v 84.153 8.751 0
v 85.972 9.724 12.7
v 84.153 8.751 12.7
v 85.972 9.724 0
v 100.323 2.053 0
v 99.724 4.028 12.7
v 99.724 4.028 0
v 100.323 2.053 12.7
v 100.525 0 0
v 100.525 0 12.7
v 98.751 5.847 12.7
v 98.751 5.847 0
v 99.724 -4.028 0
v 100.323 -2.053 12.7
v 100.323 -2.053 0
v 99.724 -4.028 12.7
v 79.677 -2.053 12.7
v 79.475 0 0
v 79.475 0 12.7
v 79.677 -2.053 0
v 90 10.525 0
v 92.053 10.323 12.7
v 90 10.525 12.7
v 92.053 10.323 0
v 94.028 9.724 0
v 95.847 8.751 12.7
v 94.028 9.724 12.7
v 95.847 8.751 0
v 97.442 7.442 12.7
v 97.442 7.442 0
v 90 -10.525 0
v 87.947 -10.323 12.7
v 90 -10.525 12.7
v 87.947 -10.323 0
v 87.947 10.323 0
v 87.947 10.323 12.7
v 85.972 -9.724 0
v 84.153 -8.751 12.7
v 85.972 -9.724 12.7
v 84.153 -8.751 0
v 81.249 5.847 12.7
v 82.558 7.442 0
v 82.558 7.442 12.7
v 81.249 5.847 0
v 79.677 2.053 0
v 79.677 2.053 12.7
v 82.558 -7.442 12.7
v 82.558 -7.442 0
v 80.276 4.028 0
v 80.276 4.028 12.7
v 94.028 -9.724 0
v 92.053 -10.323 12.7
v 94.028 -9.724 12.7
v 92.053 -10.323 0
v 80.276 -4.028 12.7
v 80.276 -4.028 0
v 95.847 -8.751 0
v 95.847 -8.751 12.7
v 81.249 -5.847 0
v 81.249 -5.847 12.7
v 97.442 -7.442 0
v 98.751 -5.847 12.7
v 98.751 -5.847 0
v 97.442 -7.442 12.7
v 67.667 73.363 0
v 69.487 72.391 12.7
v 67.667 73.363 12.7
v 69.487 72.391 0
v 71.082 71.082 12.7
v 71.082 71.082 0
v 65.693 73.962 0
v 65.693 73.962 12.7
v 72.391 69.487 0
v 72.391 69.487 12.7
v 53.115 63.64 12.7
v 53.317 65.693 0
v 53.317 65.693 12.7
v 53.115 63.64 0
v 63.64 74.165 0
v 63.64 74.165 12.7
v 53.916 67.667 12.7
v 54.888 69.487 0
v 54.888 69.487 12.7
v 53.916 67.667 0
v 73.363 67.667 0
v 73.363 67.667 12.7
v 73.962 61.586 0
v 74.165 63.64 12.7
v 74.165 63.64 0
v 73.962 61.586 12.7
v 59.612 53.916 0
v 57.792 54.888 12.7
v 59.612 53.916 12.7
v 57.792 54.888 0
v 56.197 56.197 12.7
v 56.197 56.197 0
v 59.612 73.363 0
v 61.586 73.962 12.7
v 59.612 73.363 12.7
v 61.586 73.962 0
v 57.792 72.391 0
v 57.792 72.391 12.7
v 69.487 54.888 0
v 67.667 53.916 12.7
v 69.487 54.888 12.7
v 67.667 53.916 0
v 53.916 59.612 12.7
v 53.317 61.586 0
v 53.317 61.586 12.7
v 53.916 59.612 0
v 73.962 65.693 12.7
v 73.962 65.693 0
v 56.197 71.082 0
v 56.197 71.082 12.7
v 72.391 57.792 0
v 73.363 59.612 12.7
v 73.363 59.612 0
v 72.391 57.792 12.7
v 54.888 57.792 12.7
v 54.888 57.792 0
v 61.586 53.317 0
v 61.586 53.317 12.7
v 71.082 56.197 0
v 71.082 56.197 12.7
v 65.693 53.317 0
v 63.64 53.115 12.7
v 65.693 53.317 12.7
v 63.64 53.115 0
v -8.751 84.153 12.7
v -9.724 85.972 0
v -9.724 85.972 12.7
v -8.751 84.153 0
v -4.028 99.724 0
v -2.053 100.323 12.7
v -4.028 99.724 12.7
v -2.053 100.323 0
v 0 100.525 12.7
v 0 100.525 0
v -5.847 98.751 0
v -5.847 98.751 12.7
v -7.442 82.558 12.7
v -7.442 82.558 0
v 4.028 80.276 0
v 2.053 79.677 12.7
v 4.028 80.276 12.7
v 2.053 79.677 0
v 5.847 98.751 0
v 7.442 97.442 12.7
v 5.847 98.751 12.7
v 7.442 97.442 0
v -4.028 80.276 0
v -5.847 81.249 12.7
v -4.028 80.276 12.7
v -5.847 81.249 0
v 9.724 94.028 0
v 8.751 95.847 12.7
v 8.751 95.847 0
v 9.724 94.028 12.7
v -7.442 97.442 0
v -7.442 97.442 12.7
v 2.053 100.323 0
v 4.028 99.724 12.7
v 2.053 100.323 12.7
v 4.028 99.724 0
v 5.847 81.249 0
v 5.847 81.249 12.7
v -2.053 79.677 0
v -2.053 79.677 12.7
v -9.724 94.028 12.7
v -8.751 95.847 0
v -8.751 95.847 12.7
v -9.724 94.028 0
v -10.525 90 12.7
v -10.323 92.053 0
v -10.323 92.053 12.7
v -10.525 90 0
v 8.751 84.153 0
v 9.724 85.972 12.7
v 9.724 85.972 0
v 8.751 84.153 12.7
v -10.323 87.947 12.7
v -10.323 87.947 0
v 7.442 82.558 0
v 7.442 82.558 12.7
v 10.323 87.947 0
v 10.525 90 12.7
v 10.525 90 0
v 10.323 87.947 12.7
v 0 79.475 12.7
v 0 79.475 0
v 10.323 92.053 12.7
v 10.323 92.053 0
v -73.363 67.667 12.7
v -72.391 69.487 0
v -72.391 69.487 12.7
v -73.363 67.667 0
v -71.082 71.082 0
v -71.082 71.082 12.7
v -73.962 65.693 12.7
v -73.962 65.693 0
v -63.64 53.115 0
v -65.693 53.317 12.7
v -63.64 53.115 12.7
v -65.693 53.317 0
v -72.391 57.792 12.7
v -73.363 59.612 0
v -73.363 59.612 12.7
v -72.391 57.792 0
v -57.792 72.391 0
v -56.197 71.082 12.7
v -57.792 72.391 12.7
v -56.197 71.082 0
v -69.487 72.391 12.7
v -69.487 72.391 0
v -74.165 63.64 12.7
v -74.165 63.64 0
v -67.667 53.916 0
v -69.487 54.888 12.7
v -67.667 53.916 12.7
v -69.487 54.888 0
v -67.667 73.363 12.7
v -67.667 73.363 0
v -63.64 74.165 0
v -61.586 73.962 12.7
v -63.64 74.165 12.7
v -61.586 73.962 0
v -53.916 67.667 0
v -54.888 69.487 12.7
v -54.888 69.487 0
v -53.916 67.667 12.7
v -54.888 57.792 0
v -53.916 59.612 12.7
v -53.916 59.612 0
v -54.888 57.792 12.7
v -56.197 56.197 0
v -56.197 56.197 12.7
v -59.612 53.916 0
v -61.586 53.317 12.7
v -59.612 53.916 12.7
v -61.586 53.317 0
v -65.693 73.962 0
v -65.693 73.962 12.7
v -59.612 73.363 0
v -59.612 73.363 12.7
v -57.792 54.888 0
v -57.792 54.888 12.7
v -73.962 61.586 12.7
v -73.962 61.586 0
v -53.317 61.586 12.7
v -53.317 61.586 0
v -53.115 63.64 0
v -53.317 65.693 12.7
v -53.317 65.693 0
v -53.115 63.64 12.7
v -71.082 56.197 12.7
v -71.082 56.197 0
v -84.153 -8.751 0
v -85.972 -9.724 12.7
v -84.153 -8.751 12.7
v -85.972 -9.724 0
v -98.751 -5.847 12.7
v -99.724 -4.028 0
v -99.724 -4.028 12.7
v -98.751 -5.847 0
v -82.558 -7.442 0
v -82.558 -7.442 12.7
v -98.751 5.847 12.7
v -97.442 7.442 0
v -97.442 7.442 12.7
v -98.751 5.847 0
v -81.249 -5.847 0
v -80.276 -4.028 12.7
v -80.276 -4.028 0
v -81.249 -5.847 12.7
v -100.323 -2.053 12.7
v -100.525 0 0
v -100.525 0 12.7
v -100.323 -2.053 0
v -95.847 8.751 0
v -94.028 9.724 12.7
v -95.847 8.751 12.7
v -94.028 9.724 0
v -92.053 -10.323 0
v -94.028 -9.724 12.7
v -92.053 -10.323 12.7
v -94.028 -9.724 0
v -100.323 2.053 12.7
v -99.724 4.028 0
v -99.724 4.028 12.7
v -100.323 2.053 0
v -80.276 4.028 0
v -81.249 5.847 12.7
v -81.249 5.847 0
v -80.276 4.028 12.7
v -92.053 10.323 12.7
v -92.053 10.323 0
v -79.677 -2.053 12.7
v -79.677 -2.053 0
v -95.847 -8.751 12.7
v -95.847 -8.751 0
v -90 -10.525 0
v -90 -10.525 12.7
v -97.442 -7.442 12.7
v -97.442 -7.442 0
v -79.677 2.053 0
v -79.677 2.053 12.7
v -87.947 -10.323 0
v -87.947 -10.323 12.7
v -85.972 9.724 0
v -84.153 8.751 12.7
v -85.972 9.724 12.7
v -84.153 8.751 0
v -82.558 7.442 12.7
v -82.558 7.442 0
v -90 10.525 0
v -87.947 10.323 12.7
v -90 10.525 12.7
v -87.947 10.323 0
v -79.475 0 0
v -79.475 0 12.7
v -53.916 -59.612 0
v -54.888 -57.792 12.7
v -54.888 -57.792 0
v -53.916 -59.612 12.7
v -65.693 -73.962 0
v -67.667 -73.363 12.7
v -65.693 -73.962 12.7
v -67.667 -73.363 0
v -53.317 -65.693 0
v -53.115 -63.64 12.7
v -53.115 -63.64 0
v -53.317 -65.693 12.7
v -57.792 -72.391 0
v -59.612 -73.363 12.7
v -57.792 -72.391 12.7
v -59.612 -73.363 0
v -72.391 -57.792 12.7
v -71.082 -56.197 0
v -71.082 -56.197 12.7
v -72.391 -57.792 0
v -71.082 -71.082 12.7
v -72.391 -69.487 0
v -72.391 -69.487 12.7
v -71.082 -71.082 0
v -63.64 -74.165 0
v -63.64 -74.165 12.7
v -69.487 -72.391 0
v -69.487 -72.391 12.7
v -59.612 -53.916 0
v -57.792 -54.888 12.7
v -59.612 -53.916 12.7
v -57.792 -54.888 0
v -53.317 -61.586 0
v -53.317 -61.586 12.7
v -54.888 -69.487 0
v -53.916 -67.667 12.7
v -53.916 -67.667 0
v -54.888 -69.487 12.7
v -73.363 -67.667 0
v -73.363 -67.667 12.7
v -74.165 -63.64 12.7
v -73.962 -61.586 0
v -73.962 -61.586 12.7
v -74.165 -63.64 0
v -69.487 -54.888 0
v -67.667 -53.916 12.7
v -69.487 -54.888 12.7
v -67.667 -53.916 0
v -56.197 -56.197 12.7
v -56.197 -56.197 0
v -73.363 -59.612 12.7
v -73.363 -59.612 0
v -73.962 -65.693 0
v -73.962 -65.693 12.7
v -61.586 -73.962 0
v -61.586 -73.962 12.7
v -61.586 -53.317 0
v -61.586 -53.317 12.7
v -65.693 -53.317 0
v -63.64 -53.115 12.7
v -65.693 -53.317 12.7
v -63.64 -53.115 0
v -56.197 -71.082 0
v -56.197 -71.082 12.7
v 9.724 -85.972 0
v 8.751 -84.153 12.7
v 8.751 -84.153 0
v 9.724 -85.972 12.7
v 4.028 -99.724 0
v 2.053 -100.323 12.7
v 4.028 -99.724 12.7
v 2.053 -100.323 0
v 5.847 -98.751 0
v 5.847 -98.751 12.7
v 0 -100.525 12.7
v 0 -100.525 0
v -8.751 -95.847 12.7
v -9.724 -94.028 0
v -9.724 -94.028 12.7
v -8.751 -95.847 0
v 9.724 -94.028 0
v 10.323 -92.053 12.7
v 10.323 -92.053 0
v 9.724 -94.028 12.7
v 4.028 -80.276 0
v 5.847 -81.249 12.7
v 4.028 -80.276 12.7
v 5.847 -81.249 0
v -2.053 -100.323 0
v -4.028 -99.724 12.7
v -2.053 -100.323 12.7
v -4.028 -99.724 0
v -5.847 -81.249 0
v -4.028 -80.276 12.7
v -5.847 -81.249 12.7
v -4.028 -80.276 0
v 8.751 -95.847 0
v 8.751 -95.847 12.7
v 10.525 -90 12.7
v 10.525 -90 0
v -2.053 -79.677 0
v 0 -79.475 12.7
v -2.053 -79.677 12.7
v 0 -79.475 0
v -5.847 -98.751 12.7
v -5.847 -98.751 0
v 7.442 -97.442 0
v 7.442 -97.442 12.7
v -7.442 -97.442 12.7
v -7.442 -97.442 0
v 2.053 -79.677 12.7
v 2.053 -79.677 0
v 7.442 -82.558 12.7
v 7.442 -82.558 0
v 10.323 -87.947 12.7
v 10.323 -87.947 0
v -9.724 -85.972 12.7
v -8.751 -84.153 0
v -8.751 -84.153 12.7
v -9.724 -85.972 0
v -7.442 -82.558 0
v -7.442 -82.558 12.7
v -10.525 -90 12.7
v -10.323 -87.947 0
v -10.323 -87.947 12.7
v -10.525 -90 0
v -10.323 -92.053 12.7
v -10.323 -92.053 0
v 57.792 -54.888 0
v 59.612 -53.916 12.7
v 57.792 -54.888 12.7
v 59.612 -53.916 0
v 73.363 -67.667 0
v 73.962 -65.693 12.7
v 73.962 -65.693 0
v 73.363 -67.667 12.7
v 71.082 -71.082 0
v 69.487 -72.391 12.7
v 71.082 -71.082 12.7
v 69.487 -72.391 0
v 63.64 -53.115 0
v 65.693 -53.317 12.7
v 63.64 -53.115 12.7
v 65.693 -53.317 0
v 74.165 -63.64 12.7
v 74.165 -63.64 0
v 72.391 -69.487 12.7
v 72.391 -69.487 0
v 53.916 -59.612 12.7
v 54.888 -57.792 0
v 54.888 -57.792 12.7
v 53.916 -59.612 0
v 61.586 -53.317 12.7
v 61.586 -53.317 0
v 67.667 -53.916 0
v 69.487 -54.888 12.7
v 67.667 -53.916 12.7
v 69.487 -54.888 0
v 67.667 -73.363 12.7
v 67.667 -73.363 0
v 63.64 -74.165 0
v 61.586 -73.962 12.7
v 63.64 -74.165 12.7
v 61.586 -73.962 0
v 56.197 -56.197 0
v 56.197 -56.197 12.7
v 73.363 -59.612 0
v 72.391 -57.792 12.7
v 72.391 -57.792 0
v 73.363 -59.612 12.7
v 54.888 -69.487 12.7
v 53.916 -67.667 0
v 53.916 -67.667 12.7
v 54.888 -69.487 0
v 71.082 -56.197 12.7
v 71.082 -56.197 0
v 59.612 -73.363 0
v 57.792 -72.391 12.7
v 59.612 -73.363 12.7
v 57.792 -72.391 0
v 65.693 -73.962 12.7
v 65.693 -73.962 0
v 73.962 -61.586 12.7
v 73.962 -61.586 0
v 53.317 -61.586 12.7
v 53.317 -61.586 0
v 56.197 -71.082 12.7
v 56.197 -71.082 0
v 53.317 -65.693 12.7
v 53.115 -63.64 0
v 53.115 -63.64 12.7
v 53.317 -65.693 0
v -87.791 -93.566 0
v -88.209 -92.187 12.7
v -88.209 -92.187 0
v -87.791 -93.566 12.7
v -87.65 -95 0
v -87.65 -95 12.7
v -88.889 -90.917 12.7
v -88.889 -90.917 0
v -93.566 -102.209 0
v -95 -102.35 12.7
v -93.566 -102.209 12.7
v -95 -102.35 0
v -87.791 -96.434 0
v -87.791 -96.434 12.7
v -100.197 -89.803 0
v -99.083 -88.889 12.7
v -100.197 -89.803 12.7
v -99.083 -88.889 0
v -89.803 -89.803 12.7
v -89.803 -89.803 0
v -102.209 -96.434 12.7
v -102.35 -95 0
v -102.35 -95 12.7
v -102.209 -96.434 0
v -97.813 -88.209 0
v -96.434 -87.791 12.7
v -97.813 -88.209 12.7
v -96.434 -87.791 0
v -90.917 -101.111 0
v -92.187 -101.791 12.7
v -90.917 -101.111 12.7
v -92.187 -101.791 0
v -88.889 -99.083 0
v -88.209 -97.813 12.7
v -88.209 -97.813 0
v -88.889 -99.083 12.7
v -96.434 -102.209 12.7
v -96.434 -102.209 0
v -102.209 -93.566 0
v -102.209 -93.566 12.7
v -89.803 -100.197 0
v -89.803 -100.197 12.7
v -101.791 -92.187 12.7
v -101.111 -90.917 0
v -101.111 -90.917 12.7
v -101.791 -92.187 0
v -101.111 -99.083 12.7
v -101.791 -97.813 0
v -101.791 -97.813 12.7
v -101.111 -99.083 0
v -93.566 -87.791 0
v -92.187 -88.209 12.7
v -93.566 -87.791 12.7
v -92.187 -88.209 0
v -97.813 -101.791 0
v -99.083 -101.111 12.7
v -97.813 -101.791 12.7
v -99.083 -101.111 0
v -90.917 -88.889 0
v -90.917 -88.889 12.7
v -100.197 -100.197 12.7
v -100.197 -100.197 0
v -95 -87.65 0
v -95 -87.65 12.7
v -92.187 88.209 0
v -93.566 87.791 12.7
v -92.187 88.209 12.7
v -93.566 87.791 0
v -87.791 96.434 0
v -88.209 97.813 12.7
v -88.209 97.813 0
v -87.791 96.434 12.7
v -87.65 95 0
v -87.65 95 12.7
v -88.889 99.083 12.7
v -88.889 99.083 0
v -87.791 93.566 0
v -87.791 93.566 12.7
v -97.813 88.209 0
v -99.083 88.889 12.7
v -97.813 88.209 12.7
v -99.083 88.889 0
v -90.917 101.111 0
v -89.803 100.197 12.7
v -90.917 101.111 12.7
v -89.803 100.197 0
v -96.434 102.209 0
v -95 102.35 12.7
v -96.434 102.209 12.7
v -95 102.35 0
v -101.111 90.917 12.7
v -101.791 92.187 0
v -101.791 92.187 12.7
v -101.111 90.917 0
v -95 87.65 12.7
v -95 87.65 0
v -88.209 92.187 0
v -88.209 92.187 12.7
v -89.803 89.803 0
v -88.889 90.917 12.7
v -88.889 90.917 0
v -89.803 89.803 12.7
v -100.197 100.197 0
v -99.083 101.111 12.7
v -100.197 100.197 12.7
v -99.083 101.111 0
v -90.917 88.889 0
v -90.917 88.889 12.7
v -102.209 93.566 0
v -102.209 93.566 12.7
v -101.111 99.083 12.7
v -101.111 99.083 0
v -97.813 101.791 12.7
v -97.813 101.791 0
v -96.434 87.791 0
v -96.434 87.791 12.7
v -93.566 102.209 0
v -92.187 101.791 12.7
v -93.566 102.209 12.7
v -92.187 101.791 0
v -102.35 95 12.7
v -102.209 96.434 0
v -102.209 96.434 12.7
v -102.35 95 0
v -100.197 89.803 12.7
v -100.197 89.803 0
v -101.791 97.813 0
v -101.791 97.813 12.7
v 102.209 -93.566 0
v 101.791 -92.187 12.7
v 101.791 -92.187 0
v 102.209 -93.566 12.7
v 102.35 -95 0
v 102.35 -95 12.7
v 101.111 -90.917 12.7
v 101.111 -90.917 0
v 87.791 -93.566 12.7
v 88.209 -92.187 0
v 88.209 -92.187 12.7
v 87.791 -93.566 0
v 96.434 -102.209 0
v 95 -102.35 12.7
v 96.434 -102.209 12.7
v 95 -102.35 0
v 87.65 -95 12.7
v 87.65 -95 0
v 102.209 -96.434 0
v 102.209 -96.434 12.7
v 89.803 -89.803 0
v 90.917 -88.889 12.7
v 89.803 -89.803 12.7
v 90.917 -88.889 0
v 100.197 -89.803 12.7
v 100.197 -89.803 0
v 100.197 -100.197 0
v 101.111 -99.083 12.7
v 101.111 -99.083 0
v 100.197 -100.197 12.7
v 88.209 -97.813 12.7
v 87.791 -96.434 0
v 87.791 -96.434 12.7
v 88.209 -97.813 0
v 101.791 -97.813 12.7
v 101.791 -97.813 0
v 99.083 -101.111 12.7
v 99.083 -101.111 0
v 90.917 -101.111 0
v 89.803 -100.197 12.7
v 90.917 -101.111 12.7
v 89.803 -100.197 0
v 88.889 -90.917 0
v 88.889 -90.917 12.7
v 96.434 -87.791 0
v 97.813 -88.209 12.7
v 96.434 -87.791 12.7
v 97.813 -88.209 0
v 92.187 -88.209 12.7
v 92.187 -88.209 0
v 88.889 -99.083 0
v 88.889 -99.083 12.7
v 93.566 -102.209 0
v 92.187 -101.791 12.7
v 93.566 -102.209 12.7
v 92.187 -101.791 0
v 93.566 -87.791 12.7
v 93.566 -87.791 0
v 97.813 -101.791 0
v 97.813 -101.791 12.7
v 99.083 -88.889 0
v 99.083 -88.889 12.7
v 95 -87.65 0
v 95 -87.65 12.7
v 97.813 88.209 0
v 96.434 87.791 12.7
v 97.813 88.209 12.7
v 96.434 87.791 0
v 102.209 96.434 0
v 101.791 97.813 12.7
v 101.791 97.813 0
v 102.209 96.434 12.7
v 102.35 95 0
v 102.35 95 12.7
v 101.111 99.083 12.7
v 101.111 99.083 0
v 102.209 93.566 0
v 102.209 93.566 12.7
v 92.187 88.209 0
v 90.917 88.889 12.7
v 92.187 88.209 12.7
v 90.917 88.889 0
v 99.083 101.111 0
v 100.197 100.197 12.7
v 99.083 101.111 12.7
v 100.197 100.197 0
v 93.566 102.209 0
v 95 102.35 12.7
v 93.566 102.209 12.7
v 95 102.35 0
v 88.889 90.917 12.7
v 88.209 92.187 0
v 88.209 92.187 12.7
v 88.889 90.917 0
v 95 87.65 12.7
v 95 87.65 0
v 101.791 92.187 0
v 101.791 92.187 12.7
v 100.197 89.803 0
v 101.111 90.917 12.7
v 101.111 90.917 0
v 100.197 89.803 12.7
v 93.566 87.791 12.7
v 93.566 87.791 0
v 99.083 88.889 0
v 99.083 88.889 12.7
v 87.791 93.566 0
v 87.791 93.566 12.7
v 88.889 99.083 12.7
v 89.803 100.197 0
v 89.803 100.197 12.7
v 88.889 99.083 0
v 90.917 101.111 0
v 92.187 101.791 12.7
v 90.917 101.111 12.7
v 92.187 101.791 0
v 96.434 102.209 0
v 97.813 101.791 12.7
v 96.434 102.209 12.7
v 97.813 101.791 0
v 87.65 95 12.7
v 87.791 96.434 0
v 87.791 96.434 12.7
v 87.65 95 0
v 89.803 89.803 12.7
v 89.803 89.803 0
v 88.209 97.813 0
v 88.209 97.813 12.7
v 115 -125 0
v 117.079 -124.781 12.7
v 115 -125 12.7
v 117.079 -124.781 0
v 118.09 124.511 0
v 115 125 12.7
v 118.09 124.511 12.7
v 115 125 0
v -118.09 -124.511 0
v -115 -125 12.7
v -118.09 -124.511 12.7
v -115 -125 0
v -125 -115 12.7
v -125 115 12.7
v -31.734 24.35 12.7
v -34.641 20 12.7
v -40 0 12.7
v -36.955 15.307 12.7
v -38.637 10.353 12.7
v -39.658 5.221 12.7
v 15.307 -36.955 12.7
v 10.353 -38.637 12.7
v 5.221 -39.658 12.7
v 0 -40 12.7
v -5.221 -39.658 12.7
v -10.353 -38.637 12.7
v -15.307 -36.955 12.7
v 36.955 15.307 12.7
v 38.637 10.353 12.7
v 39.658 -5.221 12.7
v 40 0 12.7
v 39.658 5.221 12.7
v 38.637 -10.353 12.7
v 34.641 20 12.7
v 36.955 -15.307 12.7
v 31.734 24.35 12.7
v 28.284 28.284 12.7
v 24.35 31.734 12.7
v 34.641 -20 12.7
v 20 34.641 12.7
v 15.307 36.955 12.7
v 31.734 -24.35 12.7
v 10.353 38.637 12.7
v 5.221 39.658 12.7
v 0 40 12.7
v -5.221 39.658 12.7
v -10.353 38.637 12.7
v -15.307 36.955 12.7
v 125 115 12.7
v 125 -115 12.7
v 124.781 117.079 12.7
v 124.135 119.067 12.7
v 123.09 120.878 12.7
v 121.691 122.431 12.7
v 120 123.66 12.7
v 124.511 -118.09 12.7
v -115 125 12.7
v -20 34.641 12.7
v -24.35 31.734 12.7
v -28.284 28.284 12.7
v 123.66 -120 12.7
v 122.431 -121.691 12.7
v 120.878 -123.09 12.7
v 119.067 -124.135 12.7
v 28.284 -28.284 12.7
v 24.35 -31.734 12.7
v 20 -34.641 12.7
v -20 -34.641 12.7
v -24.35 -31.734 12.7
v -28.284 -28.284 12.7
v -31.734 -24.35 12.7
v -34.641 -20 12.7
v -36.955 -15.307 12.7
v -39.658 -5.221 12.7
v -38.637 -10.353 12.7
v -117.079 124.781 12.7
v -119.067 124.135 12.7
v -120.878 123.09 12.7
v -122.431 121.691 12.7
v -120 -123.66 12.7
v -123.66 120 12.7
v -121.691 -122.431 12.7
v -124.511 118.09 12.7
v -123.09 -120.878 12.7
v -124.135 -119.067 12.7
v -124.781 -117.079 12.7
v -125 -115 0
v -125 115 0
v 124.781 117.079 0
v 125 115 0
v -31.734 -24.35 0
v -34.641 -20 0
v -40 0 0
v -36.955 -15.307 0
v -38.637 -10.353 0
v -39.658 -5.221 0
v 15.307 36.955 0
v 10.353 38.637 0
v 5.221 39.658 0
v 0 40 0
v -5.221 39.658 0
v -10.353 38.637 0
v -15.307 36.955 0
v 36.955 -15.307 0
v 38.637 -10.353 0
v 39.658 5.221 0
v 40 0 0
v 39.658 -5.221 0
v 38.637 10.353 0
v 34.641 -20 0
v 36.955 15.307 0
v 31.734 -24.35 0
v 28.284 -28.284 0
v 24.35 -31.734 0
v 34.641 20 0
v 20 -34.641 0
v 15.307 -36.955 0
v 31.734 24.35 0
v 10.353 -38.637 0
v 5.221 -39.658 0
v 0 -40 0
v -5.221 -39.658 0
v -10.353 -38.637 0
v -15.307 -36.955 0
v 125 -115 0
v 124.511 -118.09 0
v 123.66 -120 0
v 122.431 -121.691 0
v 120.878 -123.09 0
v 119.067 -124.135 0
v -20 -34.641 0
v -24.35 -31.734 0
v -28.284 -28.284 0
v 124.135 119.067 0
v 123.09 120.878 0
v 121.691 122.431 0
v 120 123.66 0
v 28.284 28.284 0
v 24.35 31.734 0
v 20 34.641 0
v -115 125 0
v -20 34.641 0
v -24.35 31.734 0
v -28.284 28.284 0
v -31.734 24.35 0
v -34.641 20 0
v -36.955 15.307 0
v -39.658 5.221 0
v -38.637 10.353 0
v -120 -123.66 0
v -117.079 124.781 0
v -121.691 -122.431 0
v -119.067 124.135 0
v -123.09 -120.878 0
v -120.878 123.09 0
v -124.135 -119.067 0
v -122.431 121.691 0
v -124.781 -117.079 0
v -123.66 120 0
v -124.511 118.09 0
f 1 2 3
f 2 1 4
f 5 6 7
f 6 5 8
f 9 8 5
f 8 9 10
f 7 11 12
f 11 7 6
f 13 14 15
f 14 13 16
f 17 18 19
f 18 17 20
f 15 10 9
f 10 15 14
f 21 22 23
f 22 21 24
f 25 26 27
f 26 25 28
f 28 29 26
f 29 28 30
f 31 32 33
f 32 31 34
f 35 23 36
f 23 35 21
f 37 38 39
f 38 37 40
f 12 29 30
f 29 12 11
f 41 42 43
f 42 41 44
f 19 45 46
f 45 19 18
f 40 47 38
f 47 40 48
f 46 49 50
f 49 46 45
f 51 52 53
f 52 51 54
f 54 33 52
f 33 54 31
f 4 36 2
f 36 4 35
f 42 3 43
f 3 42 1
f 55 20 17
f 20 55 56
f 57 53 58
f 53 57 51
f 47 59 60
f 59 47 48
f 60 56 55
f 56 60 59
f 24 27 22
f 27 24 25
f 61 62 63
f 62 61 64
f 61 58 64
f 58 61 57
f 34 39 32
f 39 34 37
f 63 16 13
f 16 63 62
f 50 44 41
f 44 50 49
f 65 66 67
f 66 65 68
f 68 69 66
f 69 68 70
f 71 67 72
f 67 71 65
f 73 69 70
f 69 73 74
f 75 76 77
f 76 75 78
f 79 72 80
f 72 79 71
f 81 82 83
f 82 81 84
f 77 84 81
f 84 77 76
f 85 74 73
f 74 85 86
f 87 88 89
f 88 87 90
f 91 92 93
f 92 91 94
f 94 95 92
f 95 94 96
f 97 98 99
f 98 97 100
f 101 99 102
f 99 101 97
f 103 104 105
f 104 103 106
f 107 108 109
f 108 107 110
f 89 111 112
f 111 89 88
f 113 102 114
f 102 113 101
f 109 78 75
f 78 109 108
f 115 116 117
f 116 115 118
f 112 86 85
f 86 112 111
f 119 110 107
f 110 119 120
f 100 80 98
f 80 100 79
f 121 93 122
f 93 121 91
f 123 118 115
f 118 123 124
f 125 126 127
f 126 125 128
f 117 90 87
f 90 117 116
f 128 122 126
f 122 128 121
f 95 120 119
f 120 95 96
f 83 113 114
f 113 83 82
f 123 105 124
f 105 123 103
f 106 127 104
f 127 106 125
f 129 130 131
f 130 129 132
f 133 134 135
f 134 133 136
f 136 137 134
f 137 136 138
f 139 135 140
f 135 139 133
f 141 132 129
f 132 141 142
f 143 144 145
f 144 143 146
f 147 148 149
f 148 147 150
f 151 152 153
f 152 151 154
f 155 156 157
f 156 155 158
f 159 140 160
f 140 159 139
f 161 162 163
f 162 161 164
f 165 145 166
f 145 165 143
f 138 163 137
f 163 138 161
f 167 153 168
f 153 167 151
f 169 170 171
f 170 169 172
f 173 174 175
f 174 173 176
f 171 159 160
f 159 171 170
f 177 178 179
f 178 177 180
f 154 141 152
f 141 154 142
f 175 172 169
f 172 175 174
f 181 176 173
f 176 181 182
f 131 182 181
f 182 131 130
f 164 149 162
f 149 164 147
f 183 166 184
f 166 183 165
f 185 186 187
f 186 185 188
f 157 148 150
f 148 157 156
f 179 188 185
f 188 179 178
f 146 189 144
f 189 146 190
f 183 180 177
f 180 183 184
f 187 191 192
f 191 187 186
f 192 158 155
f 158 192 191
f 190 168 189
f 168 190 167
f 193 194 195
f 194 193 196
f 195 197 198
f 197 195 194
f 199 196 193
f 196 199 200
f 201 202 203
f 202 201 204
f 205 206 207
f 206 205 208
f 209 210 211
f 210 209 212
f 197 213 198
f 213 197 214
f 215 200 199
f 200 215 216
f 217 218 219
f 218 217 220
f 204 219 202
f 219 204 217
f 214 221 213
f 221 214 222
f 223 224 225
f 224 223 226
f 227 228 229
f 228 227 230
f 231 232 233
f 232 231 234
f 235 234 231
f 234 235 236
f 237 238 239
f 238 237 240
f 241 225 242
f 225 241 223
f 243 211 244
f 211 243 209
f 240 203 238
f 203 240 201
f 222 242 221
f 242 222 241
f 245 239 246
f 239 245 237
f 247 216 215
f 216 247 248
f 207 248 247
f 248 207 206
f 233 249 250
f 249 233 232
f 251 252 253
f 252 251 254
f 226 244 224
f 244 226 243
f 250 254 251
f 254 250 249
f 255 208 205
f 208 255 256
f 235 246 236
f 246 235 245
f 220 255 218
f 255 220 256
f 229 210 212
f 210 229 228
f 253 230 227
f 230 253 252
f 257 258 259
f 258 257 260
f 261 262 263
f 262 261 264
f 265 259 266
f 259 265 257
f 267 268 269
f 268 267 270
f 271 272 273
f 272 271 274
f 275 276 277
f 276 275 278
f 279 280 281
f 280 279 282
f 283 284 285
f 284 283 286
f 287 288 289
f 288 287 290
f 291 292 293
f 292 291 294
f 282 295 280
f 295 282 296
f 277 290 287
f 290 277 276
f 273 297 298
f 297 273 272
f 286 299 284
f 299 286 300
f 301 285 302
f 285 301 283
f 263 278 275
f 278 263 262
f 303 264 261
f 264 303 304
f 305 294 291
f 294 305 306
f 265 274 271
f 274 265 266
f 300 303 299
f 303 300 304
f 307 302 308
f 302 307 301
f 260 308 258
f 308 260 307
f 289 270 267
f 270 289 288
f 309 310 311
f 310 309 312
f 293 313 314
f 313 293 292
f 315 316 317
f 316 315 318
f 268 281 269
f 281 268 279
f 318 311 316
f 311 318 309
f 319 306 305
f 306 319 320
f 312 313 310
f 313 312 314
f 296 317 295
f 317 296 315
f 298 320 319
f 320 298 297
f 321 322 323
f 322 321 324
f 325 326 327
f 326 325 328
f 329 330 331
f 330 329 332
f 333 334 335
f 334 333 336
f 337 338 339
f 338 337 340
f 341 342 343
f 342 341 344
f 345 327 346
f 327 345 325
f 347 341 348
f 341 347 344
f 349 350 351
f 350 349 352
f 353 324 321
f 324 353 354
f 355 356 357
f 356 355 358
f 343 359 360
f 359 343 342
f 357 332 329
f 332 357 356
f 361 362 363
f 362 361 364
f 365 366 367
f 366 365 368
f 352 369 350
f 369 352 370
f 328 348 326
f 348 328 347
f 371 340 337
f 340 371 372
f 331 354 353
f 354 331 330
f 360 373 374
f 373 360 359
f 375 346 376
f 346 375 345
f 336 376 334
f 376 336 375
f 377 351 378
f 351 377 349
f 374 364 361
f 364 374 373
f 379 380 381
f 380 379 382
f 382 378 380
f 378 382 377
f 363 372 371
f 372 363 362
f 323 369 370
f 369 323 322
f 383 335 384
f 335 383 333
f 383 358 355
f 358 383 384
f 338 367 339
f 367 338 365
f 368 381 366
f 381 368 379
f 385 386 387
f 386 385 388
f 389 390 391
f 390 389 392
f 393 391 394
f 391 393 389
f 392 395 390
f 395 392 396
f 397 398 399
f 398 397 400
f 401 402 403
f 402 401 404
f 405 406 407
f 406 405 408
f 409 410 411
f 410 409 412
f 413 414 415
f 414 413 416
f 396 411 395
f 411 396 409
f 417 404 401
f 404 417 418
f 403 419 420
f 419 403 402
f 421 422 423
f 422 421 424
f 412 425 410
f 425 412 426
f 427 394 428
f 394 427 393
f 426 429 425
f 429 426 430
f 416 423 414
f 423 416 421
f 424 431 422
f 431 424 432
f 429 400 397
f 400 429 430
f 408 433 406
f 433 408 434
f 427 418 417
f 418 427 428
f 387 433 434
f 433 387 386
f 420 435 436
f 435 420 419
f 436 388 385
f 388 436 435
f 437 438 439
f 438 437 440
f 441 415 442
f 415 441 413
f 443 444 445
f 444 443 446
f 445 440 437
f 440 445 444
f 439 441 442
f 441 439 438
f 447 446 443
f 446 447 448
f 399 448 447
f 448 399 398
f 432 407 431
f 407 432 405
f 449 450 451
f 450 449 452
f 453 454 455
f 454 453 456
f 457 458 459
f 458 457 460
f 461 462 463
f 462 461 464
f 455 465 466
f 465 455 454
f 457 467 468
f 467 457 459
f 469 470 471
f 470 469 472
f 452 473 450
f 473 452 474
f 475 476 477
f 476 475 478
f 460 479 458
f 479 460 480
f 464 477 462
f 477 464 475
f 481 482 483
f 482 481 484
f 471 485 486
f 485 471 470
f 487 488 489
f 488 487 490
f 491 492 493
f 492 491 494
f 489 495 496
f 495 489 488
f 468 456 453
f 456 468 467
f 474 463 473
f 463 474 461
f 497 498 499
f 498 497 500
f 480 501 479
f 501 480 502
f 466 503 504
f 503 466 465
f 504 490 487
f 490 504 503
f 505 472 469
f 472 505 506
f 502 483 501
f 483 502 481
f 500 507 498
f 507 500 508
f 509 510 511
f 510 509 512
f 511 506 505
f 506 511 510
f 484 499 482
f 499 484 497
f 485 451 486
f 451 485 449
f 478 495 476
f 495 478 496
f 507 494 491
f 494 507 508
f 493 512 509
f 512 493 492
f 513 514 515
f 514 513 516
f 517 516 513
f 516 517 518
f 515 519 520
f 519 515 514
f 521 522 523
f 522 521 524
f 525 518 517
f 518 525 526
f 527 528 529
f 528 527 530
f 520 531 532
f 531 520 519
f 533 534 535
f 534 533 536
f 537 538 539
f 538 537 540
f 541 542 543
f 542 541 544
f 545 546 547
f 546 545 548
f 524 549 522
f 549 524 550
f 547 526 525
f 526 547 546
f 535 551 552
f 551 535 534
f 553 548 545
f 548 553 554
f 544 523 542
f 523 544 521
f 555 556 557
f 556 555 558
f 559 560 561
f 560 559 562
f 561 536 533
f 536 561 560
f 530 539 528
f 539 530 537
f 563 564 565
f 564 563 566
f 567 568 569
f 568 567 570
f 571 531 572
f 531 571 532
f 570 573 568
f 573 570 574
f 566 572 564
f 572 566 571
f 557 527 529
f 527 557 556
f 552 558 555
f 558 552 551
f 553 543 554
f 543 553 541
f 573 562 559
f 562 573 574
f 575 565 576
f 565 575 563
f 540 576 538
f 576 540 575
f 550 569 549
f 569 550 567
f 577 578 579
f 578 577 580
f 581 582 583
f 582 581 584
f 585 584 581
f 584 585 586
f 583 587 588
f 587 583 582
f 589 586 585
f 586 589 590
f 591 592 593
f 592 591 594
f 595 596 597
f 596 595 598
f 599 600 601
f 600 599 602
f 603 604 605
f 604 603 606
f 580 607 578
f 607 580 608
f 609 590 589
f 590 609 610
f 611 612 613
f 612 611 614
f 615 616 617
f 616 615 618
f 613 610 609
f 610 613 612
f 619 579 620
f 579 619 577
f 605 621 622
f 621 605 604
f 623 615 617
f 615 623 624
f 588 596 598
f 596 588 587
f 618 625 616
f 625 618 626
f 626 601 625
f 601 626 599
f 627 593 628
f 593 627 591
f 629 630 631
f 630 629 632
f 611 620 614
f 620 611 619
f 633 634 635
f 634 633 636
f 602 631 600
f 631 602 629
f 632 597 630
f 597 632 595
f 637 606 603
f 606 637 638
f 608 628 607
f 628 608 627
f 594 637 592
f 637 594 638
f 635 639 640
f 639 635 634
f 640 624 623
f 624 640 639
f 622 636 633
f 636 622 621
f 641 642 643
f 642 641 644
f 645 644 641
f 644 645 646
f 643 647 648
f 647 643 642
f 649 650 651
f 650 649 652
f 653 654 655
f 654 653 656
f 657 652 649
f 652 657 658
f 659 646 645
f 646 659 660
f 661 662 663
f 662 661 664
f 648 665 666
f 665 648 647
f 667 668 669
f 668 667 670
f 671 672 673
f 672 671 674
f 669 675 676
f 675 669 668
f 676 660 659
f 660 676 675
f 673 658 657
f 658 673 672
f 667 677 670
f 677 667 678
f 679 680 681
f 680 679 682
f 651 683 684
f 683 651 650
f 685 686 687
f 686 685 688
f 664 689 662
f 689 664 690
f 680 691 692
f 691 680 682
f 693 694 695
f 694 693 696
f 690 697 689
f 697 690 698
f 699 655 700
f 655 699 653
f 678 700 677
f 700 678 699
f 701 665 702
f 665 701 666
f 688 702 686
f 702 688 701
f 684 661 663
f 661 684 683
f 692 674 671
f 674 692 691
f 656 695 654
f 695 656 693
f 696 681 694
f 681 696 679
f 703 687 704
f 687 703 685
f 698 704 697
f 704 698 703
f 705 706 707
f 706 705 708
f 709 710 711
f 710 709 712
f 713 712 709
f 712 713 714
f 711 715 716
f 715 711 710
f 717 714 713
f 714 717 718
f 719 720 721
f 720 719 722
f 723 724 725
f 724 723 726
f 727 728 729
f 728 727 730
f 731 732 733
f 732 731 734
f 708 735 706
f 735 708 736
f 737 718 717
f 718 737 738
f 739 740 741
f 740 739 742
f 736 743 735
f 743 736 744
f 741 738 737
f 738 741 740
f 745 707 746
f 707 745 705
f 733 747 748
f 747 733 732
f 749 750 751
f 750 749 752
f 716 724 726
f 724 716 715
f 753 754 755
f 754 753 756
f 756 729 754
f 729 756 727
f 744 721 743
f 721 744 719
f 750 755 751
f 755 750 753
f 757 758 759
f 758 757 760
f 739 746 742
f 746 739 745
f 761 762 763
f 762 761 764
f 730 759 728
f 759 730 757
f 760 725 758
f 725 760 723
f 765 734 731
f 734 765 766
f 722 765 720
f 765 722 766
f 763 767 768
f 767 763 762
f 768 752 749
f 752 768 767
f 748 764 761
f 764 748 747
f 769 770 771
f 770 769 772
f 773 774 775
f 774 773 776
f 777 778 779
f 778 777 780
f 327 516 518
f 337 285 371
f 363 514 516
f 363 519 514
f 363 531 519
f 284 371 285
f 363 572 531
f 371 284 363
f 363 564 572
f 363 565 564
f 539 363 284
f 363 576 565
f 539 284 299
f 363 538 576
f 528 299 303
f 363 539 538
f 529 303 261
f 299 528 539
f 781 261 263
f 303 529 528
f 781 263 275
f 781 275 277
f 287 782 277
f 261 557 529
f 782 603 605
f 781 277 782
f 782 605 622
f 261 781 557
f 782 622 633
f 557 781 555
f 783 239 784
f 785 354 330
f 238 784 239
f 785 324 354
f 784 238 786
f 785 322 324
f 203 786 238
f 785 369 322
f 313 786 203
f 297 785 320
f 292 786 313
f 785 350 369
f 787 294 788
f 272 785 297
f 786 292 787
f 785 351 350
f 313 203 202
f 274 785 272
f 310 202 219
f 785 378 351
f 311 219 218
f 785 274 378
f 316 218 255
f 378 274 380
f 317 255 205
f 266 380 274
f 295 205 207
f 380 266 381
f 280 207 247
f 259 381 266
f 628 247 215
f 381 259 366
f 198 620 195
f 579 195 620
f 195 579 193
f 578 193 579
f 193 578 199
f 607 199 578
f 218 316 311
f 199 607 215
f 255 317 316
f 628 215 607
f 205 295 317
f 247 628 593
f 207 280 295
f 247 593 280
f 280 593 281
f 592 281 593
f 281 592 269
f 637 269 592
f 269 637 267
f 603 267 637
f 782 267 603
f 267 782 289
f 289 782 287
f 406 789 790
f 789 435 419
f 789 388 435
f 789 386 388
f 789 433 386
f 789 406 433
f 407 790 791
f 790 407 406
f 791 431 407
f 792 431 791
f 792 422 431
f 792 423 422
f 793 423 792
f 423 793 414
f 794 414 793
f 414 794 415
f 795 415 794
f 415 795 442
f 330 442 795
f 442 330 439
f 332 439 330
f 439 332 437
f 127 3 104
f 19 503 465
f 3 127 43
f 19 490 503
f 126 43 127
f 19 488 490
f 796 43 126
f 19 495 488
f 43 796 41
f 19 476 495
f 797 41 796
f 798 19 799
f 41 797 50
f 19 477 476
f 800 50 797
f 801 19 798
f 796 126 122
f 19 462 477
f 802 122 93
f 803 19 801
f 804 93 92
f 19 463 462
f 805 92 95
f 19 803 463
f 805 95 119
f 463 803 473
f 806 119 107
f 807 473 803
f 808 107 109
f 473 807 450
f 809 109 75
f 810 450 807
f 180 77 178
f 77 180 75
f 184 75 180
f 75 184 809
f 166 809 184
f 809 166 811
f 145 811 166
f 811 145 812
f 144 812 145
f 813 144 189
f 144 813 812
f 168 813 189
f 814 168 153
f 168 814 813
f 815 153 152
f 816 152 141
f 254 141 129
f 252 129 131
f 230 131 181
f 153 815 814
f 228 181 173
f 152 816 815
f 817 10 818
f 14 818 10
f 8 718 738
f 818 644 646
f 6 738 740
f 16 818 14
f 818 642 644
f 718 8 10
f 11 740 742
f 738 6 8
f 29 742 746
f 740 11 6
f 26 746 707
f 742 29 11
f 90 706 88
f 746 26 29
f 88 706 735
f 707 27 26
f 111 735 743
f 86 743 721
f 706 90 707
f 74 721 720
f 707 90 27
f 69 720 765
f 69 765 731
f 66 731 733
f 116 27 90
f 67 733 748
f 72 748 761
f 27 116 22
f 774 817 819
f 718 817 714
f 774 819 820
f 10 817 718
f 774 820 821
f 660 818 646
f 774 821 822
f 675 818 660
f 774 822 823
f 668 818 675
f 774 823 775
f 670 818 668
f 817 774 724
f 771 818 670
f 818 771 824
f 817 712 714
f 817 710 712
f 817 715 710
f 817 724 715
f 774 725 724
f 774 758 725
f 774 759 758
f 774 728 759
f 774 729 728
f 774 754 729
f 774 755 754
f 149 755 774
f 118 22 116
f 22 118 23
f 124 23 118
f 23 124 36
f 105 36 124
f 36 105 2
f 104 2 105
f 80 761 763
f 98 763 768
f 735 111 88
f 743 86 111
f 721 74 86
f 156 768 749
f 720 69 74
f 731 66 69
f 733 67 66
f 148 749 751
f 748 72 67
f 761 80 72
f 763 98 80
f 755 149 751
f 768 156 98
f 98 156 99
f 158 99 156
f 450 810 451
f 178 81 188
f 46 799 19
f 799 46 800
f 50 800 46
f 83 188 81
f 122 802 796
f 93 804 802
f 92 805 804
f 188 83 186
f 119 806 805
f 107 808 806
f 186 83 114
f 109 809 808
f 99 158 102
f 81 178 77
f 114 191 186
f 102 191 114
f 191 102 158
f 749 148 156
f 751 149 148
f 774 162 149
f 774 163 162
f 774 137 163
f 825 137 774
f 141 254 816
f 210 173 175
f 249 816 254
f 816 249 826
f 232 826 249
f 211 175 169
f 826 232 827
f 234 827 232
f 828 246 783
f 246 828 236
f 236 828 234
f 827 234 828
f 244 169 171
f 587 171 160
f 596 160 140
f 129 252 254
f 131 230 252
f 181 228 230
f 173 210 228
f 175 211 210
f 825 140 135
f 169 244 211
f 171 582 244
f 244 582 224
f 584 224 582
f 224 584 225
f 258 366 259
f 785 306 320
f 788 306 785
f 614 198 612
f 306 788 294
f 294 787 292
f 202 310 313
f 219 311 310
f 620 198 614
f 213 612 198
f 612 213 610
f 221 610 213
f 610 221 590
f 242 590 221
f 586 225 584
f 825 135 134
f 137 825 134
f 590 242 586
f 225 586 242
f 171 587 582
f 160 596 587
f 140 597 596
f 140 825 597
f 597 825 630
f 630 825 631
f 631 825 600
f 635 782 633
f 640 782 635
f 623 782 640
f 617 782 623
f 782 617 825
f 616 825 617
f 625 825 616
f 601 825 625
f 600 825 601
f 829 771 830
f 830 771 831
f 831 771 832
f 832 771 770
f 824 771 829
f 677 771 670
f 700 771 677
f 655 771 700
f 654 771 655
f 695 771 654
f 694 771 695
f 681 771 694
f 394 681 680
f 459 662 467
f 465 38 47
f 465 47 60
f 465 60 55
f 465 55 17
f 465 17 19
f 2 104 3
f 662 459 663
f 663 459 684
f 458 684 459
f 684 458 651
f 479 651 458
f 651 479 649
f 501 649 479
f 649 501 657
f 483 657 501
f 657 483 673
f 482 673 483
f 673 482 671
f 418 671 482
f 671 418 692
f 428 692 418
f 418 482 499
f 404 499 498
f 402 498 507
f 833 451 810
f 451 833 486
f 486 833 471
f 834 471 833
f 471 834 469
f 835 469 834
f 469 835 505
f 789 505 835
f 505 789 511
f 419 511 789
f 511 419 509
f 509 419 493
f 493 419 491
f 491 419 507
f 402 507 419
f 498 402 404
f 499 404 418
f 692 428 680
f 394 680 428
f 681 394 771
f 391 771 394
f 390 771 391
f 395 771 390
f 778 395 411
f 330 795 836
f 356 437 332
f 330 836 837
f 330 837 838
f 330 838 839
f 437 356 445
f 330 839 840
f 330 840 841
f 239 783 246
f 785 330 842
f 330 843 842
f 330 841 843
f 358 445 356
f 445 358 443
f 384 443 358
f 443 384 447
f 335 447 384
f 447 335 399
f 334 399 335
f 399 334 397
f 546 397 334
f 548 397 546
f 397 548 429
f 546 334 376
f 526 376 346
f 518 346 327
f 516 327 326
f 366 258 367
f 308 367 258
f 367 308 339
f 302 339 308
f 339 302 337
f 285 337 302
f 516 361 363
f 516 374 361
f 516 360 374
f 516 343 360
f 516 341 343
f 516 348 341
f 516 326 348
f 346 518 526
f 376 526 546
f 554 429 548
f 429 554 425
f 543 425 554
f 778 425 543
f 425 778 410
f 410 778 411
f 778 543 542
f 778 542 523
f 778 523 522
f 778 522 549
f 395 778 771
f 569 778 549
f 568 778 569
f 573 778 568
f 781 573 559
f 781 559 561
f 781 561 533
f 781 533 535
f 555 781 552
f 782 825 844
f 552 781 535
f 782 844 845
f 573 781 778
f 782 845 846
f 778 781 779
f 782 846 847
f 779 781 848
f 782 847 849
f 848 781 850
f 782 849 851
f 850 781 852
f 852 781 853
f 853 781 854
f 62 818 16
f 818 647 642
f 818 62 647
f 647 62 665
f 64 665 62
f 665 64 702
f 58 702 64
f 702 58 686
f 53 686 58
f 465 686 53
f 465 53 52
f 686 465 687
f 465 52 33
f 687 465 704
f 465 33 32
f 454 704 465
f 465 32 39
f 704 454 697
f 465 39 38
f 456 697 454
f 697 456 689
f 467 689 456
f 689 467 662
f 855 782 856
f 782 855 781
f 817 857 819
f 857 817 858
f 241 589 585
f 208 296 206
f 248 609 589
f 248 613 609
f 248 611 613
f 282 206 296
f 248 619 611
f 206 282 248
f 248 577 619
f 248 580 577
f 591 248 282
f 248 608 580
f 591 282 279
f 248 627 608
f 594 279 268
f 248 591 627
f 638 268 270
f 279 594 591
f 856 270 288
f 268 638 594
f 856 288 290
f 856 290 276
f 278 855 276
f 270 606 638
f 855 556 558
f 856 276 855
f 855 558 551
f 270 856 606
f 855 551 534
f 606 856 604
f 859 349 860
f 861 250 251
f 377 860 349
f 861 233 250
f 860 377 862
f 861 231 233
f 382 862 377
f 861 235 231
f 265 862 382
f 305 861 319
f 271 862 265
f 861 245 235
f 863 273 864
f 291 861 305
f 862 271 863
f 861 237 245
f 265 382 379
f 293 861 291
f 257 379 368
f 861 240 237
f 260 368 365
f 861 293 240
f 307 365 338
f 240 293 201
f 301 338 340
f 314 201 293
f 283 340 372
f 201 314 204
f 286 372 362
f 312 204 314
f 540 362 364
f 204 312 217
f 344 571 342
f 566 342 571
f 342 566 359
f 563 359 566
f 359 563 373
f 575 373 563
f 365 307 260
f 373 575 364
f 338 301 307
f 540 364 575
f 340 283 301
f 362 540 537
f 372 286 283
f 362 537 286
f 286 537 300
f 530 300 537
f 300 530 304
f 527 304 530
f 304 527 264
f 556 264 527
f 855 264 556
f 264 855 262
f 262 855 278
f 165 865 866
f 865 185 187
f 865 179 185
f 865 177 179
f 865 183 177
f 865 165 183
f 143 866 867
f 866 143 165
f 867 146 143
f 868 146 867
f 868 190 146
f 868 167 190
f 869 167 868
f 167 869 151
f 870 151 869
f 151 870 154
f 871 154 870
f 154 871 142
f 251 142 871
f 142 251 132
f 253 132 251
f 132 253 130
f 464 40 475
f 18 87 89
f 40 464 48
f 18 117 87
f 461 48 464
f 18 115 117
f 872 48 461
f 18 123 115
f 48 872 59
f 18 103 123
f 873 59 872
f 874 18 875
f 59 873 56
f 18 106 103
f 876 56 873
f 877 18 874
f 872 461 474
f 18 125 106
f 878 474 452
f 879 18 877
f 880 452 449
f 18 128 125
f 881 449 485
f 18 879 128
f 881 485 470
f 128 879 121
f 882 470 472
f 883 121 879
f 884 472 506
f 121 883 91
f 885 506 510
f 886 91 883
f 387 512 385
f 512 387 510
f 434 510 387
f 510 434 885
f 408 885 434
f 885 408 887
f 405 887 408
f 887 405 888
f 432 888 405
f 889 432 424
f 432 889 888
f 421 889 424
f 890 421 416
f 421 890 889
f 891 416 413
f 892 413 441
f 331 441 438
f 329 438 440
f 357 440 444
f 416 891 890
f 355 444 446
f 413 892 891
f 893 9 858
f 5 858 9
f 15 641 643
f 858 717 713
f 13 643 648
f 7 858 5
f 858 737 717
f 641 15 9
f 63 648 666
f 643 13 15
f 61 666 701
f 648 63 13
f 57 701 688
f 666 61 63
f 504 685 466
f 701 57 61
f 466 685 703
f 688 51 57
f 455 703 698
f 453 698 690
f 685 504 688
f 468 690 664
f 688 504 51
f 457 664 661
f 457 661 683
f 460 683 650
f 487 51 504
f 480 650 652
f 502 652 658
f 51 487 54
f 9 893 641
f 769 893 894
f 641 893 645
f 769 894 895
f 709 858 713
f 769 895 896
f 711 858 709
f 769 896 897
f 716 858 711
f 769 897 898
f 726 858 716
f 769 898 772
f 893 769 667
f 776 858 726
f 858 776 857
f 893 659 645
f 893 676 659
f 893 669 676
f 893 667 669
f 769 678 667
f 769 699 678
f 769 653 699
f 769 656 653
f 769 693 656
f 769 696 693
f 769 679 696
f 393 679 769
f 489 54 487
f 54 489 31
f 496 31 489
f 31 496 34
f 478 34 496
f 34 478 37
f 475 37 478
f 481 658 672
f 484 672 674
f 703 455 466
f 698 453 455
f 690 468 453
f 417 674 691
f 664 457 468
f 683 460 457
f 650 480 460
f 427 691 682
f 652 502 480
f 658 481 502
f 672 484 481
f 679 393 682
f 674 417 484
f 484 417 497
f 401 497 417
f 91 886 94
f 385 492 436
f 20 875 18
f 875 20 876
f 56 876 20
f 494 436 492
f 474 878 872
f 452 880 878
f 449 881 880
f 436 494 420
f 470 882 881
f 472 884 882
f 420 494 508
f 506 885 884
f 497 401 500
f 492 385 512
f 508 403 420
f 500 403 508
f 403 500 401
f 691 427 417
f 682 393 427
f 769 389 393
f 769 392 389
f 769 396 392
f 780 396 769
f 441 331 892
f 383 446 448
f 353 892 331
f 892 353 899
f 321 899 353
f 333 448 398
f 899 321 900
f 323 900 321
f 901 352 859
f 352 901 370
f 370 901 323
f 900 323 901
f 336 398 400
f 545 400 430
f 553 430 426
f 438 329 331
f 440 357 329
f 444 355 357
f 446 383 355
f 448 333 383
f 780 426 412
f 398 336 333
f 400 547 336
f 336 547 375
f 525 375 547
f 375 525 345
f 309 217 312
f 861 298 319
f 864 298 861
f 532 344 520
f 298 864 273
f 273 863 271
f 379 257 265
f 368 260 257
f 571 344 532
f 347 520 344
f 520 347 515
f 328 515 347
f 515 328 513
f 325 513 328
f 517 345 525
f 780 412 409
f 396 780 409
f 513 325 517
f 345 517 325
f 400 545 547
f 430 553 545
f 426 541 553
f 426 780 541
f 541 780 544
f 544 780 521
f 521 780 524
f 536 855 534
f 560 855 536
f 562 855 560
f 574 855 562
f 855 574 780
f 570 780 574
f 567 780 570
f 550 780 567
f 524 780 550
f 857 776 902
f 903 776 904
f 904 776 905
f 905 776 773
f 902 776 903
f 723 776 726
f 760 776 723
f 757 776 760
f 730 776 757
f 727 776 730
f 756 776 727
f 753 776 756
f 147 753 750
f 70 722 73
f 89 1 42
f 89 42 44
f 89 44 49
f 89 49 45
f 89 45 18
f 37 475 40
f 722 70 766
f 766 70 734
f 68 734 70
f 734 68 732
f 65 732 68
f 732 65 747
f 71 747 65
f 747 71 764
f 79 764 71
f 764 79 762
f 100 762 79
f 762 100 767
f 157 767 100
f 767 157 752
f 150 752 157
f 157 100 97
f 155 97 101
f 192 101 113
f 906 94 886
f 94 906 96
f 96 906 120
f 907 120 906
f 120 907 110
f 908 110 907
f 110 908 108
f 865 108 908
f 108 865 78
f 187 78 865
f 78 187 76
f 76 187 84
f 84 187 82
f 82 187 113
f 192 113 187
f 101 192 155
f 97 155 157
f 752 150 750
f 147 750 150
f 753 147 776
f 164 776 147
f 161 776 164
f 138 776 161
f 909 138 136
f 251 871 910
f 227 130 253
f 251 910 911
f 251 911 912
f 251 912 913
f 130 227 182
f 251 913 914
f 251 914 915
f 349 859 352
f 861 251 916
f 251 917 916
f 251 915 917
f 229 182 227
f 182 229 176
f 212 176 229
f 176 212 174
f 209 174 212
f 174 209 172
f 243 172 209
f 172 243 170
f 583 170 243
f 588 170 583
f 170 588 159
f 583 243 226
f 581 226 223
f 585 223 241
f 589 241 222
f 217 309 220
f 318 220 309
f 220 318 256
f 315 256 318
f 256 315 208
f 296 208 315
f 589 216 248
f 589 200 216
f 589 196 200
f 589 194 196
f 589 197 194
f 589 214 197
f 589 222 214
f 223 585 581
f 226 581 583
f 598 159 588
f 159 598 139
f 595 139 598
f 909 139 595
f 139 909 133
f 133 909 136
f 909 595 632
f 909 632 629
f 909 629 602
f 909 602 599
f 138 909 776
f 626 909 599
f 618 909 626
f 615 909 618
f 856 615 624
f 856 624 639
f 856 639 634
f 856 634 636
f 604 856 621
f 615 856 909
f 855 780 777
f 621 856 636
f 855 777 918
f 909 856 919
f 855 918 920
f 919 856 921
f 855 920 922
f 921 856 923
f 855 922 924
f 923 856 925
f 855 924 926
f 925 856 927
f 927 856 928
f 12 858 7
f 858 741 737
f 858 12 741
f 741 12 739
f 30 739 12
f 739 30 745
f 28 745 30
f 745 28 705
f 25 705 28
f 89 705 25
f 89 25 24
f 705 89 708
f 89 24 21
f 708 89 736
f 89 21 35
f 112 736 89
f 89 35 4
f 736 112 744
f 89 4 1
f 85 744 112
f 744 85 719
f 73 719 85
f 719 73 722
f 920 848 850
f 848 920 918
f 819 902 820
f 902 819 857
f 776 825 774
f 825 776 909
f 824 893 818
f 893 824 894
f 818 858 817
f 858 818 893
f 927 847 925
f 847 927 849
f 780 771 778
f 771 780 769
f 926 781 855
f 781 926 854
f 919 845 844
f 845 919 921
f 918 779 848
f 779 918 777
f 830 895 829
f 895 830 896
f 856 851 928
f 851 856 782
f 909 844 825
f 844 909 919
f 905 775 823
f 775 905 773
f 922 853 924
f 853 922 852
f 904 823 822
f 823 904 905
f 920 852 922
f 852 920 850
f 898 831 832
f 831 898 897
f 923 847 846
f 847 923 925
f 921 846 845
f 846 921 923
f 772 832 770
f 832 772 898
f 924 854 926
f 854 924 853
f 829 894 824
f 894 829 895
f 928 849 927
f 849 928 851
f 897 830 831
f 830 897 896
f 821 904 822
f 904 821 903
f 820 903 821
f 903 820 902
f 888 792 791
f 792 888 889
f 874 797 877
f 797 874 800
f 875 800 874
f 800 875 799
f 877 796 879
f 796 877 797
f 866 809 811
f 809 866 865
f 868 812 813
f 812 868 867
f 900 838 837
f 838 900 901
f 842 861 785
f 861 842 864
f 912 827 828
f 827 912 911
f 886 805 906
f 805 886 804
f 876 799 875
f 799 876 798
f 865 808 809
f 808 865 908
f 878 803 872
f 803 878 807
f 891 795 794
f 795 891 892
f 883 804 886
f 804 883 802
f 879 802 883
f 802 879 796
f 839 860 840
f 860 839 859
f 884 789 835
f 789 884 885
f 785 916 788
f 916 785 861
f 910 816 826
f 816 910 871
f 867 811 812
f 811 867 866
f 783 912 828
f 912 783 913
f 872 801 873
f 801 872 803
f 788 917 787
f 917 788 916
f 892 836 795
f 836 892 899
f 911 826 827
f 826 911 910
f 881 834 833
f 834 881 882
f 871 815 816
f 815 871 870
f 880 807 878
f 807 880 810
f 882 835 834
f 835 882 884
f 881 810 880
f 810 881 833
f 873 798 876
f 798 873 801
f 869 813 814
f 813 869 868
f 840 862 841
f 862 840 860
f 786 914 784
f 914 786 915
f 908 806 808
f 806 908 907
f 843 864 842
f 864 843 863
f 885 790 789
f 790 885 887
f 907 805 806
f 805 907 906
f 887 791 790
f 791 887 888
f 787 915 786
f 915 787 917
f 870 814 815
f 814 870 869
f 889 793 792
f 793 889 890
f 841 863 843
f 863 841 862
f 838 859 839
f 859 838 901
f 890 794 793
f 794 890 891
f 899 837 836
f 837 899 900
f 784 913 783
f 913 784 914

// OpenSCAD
// file: ../lifetrac_v25_params.scad
// lifetrac_v25_params.scad
// Essential parameters for LifeTrac v25 individual parts
// This file contains only the constants needed for part design
// Full assembly uses lifetrac_v25.scad

// -----------------------------------------------------------------------------
// Compatibility helper
// OpenSCAD throws warnings when the BOSL2 helper `parent_modules()` is missing.
// We provide a stub that returns an empty list so part files can run cleanly
// when opened directly without pulling in BOSL2.
function parent_modules() = is_undef($parent_modules) ? [] : $parent_modules;

// =============================================================================
// MATERIAL CONSTANTS
// =============================================================================

PLATE_1_4_INCH = 6.35;   // 1/4" = 6.35mm
PLATE_1_2_INCH = 12.7;   // 1/2" = 12.7mm
PLATE_3_4_INCH = 19.05;  // 3/4" = 19.05mm
TUBE_3X3_1_4 = [76.2, 6.35];    // 3"x3" x 1/4" wall
TUBE_4X4_1_4 = [101.6, 6.35];   // 4"x4" x 1/4" wall (OSE standard)
TUBE_2X2_1_4 = [50.8, 6.35];    // 2"x2" x 1/4" wall
TUBE_2X4_1_4 = [50.8, 101.6, 6.35]; // 2"x4" rectangular

// Bolt/pin diameters
PIVOT_PIN_DIA = 38.1;    // 1.5" pivot pin
BOLT_DIA_1_2 = 12.7;     // 1/2" bolt
BOLT_DIA_3_4 = 19.05;    // 3/4" bolt
BOLT_DIA_1 = 25.4;       // 1" bolt

// =============================================================================
// MACHINE DIMENSIONS
// =============================================================================

// Target size: between Toro Dingo (915mm wide) and Bobcat (1830mm wide)
MACHINE_WIDTH = 1200;    // Overall width
MACHINE_LENGTH = 1800;   // Overall length
MACHINE_HEIGHT = 1000;   // Height to top of frame
WHEEL_BASE = 1400;       // Distance between front and rear axles
TRACK_WIDTH = 900;       // Distance between centerlines of left/right side panels

// Side panel sandwich configuration
SANDWICH_SPACING = 120;  // Gap between inner and outer panels (for arm pivot)
PANEL_THICKNESS = PLATE_1_2_INCH;

// Wheel dimensions
WHEEL_DIAMETER = 500;    // 500mm diameter wheels
WHEEL_WIDTH = 200;       // 200mm wide wheels
WHEEL_CLEARANCE = 50;    // Clearance between wheel and outer panel

// Ground clearance - bottom of frame above ground
GROUND_CLEARANCE = 150;  // 150mm ground clearance under frame
WHEEL_RADIUS = WHEEL_DIAMETER / 2;

// Frame sits with bottom at GROUND_CLEARANCE height
FRAME_Z_OFFSET = GROUND_CLEARANCE;

// Calculate wheel X offset - wheels positioned outside the outer panels
WHEEL_X_OFFSET = TRACK_WIDTH/2 + SANDWICH_SPACING/2 + PANEL_THICKNESS + WHEEL_WIDTH/2 + WHEEL_CLEARANCE;

// =============================================================================
// LOADER ARM DIMENSIONS
// =============================================================================

// Design constraints
BUCKET_GROUND_CLEARANCE = 0;      // Bucket bottom at ground level when lowered
BUCKET_FRONT_CLEARANCE = 100;     // 100mm (~4") clearance between bucket back and front of machine

// Arm pivot point (at top rear of side panels - tall end)
ARM_PIVOT_Y = 200;  // Near rear of machine, between sandwich plates  
ARM_PIVOT_Z_HEIGHT = MACHINE_HEIGHT - 50;  // Height above frame bottom
ARM_PIVOT_Z = FRAME_Z_OFFSET + ARM_PIVOT_Z_HEIGHT;  // Absolute Z position

// Calculate required arm length
MIN_HORIZONTAL_REACH = WHEEL_BASE + BUCKET_FRONT_CLEARANCE - ARM_PIVOT_Y;
ARM_LENGTH = ceil(sqrt(pow(ARM_PIVOT_Z, 2) + pow(MIN_HORIZONTAL_REACH, 2)));
ARM_GROUND_ANGLE = asin(ARM_PIVOT_Z / ARM_LENGTH);  // Angle below horizontal (degrees)

ARM_TUBE_SIZE = TUBE_3X3_1_4;         // 3"x3" arm tubing
ARM_SPACING = TRACK_WIDTH;            // Distance between arm centerlines

// Arm angle limits
ARM_MIN_ANGLE = -ARM_GROUND_ANGLE;     // Lowest position (at ground)
ARM_MAX_ANGLE = 60;                     // Maximum raised position

// Cross beam configuration
CROSS_BEAM_SIZE = TUBE_2X2_1_4[0];    // 2"x2" tube size
CROSS_BEAM_CLEARANCE = 15;             // Extra clearance around cross beam in cutout
CROSS_BEAM_1_POS = ARM_LENGTH * 0.65;   // First cross beam position
CROSS_BEAM_2_POS = ARM_LENGTH * 0.95;   // Second cross beam position (near bucket)

// Pivot position in panel coordinates (for arc slot calculations)
PIVOT_PANEL_X = ARM_PIVOT_Y;                          // Pivot X in panel coords
PIVOT_PANEL_Y = ARM_PIVOT_Z - FRAME_Z_OFFSET;         // Pivot Y in panel coords

// =============================================================================
// HYDRAULIC CYLINDER MOUNTING POINTS
// =============================================================================

// Lift cylinder mounting points (arms pivot at rear, cylinders attach forward)
LIFT_CYL_BASE_Y = WHEEL_BASE * 0.5;          // Base mount Y position (forward of pivot)
LIFT_CYL_BASE_Z = FRAME_Z_OFFSET + MACHINE_HEIGHT * 0.4;      // Base mount Z position
LIFT_CYL_ARM_OFFSET = ARM_LENGTH * 0.25;     // Attachment point along arm from pivot (proportional)

// =============================================================================
// BUCKET DIMENSIONS
// =============================================================================

BOBCAT_QA_WIDTH = 1168;           // 46" standard width
BOBCAT_QA_HEIGHT = 457;           // 18" plate height
BOBCAT_QA_PIN_DIA = 25.4;         // 1" locking pin

BUCKET_WIDTH = 1100;              // Slightly narrower than QA plate
BUCKET_DEPTH = 600;
BUCKET_HEIGHT = 450;

// =============================================================================
// STANDING DECK DIMENSIONS
// =============================================================================

DECK_WIDTH = 700;
DECK_DEPTH = 400;
DECK_HEIGHT = 250;  // Height above ground
// main file
// wheel_mount.scad
// Wheel mounting plate for LifeTrac v25
// CNC cut from 1/2" plate steel
// Mounts hydraulic wheel motor

include <../lifetrac_v25_params.scad>

module wheel_mount() {
    plate_size = 250;
    
    difference() {
        // Main square plate with rounded corners
        linear_extrude(height=PLATE_1_2_INCH)
        offset(r=10) offset(r=-10)
        square([plate_size, plate_size], center=true);
        
        // Center hole for hydraulic motor shaft
        translate([0, 0, PLATE_1_2_INCH/2])
        cylinder(d=80, h=PLATE_1_2_INCH+4, center=true, $fn=48);
        
        // Bolt circle for motor mounting (8 bolts)
        for (angle = [0 : 45 : 315]) {
            rotate([0, 0, angle])
            translate([90, 0, PLATE_1_2_INCH/2])
            cylinder(d=BOLT_DIA_3_4 + 2, h=PLATE_1_2_INCH+4, center=true, $fn=32);
        }
        
        // Corner mounting holes for attaching to side panel (4 corners)
        for (x = [-1, 1]) {
            for (y = [-1, 1]) {
                translate([x * (plate_size/2 - 30), y * (plate_size/2 - 30), PLATE_1_2_INCH/2])
                cylinder(d=BOLT_DIA_1_2 + 2, h=PLATE_1_2_INCH+4, center=true, $fn=32);
            }
        }
    }
}

// Render the part for preview/export
if ($preview || len(search("wheel_mount.scad", parent_modules())) == 0) {
    wheel_mount();
}
